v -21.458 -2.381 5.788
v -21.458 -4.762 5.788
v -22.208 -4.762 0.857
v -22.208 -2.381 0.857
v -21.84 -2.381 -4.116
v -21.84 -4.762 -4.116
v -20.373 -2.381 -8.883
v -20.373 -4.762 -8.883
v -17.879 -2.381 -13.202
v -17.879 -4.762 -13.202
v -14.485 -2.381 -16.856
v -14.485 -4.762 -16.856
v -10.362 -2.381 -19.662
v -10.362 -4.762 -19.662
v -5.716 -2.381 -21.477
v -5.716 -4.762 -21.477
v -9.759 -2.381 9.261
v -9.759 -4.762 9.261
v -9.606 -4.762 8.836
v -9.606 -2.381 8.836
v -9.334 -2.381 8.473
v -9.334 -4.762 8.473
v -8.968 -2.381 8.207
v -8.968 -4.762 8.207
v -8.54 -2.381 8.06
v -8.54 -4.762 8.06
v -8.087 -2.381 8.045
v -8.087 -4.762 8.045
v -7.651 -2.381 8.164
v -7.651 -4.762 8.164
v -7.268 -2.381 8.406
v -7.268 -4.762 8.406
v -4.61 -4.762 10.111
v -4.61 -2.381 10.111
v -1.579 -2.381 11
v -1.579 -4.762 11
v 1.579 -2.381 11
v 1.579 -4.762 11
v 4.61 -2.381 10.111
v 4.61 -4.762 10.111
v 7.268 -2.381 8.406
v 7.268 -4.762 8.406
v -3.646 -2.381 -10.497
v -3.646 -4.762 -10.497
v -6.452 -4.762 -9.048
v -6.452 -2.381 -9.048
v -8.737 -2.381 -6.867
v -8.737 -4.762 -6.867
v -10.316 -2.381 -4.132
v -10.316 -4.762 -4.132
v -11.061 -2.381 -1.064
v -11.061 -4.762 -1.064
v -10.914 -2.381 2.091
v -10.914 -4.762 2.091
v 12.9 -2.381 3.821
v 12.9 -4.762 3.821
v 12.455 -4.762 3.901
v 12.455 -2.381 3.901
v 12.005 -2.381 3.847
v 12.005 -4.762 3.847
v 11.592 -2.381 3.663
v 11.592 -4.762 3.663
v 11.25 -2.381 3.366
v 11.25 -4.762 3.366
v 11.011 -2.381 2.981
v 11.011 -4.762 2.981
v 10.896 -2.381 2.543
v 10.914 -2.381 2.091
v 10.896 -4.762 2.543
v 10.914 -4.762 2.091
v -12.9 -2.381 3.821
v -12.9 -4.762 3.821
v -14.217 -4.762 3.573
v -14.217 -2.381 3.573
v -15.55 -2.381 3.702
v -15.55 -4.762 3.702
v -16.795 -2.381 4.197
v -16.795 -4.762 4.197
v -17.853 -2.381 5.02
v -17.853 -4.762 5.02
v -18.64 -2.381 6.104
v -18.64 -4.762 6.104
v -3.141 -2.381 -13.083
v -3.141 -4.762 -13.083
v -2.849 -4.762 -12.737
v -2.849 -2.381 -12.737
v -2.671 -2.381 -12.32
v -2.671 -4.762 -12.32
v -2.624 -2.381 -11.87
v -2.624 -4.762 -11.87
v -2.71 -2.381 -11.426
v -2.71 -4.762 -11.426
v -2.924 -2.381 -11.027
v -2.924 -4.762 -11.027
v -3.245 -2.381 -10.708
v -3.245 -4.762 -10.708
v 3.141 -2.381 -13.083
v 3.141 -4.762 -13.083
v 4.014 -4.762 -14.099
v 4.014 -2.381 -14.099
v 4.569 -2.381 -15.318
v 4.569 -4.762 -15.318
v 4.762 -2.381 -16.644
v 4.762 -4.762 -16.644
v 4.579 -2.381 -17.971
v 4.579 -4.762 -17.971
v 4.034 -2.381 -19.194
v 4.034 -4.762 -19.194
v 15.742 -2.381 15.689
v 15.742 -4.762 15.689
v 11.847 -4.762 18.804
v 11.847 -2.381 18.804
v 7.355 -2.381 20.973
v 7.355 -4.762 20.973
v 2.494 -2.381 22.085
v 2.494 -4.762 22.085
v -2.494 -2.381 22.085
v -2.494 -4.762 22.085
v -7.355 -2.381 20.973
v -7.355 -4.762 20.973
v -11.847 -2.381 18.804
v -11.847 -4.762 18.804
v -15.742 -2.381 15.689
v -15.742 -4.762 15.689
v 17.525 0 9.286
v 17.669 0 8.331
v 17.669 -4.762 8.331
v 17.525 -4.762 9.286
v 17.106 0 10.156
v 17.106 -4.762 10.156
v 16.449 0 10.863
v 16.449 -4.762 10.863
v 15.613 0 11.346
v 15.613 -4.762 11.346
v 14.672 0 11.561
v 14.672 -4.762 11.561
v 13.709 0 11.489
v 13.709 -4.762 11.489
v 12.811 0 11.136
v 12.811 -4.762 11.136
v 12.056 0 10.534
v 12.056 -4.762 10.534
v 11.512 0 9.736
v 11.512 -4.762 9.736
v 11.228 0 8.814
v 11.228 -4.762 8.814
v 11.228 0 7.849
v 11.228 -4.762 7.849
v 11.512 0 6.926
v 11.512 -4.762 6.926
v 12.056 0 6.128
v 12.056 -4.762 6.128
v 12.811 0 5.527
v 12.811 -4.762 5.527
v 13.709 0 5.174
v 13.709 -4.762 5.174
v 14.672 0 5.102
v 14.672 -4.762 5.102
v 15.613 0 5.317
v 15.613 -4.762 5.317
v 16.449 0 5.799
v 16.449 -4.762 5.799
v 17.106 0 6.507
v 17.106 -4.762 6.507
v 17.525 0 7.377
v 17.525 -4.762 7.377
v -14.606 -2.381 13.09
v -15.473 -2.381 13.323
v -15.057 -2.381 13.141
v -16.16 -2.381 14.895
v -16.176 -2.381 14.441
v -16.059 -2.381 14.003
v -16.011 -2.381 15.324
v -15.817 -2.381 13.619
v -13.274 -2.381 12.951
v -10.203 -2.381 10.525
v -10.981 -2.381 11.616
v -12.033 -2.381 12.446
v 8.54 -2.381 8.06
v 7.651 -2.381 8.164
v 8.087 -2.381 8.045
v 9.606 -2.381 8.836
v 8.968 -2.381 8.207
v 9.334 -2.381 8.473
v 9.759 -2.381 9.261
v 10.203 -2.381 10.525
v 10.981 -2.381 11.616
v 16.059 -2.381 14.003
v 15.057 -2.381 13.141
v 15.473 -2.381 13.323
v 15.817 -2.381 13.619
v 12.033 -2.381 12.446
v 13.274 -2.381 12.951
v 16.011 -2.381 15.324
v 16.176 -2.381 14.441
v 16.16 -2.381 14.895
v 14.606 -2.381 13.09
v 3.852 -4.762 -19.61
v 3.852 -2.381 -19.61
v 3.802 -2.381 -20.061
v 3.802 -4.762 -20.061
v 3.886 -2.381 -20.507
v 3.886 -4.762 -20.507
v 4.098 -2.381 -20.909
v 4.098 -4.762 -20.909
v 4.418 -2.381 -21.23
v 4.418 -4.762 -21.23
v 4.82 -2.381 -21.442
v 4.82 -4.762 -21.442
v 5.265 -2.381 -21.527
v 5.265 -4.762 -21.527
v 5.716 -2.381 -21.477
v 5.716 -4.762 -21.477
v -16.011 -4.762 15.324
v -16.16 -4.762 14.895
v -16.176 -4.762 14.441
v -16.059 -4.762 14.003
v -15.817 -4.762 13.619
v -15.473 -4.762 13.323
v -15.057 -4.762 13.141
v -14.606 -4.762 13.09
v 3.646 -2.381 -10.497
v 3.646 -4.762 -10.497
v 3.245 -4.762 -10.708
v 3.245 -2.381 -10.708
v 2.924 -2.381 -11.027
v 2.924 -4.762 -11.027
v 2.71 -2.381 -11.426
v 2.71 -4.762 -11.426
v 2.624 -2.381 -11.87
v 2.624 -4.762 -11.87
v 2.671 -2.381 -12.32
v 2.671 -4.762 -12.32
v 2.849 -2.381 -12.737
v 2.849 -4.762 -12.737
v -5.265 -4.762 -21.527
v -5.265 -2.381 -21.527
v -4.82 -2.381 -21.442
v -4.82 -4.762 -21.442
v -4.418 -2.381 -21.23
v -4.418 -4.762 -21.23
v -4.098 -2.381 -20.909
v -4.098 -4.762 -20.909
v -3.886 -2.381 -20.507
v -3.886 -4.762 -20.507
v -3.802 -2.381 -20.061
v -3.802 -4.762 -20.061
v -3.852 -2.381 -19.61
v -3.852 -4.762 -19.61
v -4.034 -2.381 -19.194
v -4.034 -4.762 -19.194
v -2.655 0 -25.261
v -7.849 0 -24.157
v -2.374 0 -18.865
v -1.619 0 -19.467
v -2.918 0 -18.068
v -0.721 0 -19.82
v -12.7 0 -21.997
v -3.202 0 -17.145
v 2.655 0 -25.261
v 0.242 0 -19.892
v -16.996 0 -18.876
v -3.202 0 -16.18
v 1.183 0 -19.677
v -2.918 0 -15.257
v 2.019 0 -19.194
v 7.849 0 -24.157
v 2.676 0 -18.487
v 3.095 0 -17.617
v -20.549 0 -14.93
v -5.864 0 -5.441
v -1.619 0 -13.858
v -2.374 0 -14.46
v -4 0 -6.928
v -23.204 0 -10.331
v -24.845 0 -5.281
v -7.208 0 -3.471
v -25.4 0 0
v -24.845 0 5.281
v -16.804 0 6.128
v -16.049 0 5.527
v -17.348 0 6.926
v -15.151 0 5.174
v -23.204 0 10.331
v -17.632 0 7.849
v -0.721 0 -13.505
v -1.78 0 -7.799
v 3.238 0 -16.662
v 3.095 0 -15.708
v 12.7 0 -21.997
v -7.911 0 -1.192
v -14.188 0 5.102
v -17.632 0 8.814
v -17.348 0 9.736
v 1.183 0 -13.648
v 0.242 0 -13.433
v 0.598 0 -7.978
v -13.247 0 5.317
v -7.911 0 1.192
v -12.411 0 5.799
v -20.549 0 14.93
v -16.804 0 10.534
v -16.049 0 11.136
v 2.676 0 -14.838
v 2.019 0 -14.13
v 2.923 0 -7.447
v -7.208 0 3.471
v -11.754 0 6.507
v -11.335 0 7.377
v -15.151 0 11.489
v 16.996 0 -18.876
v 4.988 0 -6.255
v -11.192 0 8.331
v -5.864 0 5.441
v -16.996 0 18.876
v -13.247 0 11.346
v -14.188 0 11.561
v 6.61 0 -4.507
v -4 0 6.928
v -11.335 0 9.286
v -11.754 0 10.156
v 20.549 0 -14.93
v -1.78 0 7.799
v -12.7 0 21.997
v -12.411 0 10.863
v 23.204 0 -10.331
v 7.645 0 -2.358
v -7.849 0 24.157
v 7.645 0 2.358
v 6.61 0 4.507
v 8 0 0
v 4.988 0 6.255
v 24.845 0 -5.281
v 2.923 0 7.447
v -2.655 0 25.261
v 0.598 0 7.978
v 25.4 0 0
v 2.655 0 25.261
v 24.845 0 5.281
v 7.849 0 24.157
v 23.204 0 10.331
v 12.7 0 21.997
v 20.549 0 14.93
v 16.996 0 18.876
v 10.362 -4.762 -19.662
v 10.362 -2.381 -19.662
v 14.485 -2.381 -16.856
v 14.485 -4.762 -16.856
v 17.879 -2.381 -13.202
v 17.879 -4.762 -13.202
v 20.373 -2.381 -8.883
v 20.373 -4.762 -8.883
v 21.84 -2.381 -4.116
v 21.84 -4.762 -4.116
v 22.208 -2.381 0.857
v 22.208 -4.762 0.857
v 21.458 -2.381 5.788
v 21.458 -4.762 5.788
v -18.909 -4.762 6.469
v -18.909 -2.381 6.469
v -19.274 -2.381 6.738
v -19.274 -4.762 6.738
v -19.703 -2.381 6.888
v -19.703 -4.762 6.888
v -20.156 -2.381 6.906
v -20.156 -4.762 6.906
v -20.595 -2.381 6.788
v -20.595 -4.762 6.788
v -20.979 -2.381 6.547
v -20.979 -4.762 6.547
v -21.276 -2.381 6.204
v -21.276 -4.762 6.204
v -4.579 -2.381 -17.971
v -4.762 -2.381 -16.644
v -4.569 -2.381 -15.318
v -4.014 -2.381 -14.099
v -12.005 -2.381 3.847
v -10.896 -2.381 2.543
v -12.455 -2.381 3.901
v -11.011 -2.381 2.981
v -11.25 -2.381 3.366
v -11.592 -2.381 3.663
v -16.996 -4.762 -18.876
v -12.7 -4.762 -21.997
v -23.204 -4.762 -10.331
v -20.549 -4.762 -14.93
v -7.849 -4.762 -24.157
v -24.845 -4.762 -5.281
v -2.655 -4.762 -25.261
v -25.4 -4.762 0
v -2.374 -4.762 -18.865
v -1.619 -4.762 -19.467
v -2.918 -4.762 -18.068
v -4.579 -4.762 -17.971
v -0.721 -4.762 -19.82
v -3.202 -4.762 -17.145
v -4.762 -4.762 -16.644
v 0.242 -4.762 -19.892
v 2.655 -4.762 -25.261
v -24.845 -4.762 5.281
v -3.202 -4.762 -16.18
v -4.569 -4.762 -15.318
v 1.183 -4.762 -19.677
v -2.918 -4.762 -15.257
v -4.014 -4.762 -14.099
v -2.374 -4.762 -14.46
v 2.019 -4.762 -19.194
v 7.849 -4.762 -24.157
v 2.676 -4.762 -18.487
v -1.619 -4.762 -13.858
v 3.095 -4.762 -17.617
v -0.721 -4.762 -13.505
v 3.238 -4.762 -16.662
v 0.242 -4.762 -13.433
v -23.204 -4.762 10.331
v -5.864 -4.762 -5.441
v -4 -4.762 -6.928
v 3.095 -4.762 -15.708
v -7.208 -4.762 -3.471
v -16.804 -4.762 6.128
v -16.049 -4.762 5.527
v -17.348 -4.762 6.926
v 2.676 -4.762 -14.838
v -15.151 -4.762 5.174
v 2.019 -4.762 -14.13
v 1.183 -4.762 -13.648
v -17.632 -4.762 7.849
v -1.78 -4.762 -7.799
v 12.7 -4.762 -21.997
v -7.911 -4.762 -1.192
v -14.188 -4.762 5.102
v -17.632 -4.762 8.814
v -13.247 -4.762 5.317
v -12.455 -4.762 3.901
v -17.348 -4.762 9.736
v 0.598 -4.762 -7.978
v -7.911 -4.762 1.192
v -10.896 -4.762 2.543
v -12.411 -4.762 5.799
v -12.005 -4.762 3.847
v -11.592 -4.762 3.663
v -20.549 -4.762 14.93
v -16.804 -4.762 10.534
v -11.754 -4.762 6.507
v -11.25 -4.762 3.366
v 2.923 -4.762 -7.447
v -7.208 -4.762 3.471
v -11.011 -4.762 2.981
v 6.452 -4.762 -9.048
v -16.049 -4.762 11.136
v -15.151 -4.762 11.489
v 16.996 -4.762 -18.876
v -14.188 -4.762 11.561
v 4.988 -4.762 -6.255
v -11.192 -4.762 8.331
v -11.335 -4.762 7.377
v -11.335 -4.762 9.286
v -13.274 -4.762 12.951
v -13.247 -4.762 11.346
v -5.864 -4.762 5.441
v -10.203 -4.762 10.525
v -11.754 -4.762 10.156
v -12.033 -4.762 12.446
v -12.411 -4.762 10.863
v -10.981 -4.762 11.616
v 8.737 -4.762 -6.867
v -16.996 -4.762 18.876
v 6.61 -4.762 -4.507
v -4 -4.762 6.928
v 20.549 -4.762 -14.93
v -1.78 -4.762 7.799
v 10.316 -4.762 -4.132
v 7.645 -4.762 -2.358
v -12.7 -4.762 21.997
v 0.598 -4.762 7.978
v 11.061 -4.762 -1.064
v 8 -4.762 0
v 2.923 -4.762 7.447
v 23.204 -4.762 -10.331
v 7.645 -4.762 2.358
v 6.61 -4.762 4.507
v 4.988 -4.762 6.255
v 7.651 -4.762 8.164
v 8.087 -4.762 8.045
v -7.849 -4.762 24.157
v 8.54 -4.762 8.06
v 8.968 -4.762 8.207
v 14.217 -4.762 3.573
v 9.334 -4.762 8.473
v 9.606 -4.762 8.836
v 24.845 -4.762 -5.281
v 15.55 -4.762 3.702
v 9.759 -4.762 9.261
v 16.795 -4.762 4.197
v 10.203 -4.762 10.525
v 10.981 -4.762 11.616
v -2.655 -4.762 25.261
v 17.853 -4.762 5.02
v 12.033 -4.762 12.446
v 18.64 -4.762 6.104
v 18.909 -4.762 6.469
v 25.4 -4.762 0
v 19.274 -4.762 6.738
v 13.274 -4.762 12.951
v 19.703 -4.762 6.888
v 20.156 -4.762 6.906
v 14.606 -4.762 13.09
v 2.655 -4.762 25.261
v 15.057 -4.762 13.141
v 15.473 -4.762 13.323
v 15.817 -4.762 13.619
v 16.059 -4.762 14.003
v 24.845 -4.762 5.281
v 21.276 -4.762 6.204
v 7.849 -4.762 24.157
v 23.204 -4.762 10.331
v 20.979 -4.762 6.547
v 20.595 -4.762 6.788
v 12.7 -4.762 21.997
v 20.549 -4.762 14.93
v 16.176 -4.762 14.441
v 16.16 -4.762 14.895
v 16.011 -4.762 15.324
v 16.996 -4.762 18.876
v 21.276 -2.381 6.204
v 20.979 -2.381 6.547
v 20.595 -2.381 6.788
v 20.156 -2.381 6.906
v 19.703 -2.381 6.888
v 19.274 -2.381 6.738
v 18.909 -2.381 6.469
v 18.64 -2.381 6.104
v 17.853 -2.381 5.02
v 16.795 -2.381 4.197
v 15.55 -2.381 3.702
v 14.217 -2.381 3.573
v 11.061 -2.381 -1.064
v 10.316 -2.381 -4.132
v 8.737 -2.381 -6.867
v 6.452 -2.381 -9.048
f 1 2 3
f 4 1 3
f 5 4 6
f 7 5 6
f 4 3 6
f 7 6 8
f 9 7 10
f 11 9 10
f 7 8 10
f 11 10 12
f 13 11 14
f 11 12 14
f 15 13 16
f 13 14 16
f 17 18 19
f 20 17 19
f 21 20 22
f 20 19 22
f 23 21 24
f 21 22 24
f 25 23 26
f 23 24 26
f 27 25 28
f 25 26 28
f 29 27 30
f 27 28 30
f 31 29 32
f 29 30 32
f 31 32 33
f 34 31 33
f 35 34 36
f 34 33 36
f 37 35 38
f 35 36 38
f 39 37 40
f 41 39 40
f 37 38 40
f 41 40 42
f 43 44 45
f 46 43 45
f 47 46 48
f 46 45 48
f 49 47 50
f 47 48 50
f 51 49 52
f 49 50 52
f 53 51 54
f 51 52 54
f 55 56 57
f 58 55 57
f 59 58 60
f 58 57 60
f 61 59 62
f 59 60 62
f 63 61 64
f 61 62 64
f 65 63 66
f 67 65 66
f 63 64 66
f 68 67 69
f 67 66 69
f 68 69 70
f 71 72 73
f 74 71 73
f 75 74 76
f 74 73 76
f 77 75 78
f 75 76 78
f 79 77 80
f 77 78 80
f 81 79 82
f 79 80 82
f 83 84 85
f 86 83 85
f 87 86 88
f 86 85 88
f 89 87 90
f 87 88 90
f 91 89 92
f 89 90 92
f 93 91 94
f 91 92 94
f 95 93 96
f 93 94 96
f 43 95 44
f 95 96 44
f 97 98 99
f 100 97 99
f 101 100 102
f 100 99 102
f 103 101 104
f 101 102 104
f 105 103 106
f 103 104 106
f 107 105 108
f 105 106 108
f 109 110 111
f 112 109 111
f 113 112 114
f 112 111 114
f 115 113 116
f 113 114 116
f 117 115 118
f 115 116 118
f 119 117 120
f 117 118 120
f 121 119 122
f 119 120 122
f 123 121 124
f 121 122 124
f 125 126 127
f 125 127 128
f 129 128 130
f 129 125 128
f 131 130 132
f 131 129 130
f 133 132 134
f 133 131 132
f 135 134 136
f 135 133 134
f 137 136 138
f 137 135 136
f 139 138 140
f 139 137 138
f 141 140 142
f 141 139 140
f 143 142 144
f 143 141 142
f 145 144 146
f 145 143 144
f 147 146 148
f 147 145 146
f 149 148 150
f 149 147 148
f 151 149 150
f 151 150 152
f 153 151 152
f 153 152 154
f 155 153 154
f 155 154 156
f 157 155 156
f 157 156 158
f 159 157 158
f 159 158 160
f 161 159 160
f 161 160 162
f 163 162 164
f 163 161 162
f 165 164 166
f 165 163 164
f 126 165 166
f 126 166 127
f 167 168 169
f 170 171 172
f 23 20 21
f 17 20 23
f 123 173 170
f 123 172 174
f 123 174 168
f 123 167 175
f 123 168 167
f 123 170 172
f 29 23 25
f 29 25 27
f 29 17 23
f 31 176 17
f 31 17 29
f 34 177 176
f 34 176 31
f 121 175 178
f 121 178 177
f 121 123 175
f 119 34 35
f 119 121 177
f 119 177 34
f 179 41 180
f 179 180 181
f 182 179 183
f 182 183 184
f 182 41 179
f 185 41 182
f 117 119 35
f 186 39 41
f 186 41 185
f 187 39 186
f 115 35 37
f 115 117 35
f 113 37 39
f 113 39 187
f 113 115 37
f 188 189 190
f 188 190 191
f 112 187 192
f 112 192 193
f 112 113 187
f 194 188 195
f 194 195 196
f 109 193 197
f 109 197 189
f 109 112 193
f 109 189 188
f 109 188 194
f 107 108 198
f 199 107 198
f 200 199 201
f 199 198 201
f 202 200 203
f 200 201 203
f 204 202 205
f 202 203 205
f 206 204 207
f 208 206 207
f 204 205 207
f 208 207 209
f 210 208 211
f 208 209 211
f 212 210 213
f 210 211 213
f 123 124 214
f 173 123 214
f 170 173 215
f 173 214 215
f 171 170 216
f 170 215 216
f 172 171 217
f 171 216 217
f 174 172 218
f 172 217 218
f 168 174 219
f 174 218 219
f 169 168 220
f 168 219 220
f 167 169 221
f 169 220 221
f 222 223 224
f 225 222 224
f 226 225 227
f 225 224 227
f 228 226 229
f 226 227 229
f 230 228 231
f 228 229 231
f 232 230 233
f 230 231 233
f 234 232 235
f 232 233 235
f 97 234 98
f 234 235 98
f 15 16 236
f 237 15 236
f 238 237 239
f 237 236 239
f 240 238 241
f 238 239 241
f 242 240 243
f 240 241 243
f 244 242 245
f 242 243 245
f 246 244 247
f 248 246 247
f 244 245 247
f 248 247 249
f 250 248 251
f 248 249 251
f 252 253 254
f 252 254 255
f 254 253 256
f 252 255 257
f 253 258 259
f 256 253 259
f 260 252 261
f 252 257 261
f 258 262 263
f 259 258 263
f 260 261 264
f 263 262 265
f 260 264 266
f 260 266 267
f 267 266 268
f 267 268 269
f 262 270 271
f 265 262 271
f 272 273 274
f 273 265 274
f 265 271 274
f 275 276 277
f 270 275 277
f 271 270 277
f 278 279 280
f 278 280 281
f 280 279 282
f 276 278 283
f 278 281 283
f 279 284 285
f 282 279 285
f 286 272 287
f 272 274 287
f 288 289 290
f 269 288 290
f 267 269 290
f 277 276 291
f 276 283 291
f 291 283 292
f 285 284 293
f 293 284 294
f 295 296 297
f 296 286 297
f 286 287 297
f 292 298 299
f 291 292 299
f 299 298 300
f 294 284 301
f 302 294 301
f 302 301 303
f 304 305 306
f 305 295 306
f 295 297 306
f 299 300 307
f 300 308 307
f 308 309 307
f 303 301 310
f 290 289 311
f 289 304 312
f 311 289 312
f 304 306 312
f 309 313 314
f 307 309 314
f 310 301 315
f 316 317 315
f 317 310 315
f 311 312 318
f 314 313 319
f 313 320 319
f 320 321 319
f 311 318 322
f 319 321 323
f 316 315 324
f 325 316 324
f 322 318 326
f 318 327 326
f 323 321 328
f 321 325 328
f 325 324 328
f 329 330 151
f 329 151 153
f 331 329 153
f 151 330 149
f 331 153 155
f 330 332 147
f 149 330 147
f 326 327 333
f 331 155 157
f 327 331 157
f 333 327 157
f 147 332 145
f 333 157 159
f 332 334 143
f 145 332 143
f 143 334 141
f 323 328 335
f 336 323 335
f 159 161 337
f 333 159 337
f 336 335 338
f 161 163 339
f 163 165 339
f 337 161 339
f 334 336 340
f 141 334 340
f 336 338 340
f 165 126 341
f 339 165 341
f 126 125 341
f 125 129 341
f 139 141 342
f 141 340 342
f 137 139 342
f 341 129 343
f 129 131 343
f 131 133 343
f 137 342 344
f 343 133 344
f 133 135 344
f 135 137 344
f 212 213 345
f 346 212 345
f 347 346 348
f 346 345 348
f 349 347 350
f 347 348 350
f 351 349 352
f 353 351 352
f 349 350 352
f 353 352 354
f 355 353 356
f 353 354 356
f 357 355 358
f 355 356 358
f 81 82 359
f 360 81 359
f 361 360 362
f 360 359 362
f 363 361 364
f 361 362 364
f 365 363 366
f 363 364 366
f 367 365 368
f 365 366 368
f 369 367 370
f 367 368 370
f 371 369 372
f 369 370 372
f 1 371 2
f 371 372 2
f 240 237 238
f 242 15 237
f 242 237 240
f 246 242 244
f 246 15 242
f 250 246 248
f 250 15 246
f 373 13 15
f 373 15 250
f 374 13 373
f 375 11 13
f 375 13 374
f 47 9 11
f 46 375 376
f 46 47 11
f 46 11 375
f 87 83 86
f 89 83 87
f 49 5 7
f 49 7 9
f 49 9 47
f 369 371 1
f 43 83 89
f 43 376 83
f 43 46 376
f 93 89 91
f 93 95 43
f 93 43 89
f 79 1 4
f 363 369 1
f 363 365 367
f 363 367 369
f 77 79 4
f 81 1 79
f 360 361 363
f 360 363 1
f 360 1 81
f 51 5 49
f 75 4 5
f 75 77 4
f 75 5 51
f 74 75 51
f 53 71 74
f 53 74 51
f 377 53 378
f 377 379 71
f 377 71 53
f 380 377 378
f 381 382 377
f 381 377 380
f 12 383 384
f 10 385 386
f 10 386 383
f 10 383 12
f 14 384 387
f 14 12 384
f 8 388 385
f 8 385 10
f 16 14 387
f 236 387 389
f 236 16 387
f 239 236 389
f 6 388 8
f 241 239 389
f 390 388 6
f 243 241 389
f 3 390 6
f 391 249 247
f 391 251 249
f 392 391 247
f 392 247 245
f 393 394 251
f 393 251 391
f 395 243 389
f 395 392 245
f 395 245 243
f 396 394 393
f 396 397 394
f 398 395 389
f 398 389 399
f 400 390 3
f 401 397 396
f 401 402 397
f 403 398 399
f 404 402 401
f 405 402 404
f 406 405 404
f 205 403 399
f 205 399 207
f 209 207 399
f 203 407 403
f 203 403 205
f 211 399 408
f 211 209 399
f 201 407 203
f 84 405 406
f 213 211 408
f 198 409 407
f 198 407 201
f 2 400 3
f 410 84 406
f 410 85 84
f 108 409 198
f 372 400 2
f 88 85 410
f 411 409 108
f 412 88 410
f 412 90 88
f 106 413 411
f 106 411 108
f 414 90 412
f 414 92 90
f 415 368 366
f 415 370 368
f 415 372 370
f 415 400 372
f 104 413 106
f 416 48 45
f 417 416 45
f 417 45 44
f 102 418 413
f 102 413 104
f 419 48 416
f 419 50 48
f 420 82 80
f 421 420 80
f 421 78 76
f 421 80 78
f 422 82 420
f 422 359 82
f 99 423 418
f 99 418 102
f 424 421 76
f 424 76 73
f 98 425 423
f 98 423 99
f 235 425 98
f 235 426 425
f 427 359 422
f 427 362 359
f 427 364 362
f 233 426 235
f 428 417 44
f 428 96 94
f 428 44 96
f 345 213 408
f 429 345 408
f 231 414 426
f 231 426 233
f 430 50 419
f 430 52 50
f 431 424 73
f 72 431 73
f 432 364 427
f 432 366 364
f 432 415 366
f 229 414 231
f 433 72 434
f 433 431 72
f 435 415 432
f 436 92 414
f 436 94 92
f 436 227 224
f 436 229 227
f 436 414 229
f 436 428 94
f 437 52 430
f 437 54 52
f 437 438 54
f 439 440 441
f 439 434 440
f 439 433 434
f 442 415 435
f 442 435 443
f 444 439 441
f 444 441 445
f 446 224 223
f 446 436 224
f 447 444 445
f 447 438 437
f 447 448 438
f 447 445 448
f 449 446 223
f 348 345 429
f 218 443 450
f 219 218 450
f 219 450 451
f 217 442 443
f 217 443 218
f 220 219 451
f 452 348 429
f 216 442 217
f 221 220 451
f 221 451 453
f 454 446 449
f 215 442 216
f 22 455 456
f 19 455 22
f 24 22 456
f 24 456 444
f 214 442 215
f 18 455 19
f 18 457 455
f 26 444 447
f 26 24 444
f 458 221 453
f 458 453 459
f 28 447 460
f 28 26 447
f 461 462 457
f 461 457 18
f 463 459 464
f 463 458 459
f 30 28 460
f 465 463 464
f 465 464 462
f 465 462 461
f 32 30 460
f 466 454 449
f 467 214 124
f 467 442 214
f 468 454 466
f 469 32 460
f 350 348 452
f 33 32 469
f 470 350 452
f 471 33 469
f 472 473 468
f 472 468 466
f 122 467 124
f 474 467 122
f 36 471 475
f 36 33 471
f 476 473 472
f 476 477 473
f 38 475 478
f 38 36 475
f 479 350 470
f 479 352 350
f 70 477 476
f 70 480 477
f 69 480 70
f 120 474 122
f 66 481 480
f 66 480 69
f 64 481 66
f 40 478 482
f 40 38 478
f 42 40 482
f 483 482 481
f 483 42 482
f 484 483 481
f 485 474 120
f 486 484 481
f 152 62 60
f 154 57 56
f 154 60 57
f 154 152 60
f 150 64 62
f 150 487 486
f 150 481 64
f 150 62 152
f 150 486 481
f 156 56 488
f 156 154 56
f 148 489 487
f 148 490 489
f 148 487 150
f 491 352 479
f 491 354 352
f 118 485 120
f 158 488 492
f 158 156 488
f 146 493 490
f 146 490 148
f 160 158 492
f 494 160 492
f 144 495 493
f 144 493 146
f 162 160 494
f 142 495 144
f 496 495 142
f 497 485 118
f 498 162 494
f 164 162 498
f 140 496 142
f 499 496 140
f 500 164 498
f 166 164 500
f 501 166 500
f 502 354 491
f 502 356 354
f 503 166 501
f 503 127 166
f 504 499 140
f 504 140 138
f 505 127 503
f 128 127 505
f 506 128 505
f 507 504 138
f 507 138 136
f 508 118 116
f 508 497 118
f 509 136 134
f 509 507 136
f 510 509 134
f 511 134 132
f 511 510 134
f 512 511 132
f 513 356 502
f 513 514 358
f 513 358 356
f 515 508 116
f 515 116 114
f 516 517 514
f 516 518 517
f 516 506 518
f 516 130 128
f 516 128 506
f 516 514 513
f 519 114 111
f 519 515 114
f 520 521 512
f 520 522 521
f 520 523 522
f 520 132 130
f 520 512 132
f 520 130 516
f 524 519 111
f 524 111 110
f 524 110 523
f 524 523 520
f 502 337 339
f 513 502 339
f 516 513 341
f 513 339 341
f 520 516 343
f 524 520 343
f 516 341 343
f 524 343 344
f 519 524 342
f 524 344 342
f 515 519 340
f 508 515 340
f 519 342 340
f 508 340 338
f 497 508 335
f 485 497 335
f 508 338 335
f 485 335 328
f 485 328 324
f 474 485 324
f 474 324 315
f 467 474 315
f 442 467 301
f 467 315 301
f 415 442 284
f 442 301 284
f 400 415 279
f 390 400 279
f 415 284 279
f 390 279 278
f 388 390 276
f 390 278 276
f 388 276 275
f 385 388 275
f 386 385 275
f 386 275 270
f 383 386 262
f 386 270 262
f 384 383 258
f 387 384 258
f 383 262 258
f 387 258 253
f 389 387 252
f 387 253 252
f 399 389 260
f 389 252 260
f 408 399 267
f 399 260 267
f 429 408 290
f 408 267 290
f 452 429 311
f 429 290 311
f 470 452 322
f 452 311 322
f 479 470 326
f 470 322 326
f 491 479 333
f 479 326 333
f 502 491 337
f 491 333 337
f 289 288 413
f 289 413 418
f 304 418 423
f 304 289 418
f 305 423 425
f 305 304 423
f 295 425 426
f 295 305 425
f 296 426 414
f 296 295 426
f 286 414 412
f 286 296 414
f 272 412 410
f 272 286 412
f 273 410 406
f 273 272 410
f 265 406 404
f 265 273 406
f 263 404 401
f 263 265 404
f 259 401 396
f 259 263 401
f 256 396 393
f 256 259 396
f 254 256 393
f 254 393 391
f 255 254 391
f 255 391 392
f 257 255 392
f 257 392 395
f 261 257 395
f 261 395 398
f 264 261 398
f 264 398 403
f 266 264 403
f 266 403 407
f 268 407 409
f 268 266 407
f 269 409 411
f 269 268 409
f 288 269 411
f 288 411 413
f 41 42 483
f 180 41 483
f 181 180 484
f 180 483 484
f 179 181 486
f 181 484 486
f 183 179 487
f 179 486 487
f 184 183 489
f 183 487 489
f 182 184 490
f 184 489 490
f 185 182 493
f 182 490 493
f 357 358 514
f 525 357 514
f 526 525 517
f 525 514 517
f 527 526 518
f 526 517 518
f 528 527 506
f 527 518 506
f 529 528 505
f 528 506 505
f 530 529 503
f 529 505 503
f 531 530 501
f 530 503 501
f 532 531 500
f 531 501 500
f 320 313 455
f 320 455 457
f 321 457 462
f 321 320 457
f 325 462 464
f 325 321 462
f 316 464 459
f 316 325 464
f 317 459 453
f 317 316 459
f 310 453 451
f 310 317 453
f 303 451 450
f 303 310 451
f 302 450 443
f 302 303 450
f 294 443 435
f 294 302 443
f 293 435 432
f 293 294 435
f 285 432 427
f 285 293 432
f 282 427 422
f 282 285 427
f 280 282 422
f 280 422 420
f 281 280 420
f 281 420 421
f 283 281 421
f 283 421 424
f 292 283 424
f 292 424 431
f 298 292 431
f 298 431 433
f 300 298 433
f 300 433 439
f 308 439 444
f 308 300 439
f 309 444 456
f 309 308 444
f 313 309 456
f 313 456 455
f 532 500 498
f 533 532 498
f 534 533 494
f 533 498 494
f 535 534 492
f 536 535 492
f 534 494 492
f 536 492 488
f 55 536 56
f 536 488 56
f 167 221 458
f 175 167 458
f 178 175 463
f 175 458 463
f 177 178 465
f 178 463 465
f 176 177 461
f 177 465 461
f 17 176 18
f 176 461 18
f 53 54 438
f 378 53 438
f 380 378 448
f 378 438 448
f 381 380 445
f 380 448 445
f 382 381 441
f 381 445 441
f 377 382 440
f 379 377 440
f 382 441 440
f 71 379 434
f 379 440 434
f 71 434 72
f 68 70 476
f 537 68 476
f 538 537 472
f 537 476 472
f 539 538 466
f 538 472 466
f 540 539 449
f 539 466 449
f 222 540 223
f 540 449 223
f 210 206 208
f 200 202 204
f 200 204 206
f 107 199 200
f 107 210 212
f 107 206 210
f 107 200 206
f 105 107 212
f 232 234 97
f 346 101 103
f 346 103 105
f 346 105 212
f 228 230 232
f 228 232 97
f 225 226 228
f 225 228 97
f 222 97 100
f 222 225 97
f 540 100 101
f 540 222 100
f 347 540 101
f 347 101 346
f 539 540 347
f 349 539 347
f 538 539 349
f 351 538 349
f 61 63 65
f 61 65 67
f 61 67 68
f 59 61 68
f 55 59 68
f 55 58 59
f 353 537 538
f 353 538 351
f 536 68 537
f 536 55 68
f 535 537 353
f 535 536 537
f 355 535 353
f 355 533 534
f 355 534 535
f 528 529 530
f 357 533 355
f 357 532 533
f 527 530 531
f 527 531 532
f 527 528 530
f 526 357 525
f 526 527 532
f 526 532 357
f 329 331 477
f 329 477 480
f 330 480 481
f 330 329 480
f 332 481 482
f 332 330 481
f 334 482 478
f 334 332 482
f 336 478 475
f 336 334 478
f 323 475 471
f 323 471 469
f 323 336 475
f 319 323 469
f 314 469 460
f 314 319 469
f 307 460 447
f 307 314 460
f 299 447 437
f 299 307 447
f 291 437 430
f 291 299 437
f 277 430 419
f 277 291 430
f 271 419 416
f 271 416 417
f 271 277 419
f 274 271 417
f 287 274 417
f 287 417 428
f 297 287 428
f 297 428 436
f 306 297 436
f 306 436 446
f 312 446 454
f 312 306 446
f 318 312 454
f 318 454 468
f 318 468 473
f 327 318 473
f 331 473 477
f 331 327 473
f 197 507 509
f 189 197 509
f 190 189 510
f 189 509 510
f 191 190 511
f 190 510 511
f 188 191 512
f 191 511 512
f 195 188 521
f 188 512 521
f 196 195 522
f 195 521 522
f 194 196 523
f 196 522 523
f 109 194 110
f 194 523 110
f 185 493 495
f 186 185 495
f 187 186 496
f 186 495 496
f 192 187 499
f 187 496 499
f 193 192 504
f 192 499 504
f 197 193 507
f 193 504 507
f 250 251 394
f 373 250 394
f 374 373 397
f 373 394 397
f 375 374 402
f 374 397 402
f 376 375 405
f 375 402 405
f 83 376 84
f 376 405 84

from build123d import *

# Parameters (mm, degrees)
F0_R     = 25.4
F0_R_2   = 3.2385
F0_R_3   = 8
F1_DEPTH = 4.7625
F3_DEPTH = 2.38125


with BuildPart() as f1:
    # F0 (on Front) → F1 (new body)
    with BuildSketch(Plane.XZ):
        Circle(F0_R)
        with Locations((0, -16.6624)):
            Circle(F0_R_2, mode=Mode.SUBTRACT)
        Circle(F0_R_3, mode=Mode.SUBTRACT)
        with Locations((-14.430062, 8.3312)):
            Circle(F0_R_2, mode=Mode.SUBTRACT)
        with Locations((14.430062, 8.3312)):
            Circle(F0_R_2, mode=Mode.SUBTRACT)
    extrude(amount=F1_DEPTH)

    # F2 (on face) → F3 (cut)
    with BuildSketch(Plane.XZ.offset(4.7625)):
        with BuildLine():
            ThreePointArc((-3.646079, -10.497322), (-9.623707, -5.55625), (-10.913987, 2.091064))
            ThreePointArc((-10.913987, 2.091064), (-11.409826, 3.527057), (-12.900289, 3.821078))
            ThreePointArc((-12.900289, 3.821078), (-16.190201, 3.905896), (-18.639619, 6.103863))
            ThreePointArc((-18.639619, 6.103863), (-20.156405, 6.905634), (-21.458089, 5.788007))
            ThreePointArc((-21.458089, 5.788007), (-19.247415, -11.1125), (-5.716484, -21.477254))
            ThreePointArc((-5.716484, -21.477254), (-4.097748, -20.908775), (-4.033709, -19.194315))
            ThreePointArc((-4.033709, -19.194315), (-4.712495, -15.974073), (-3.140994, -13.082517))
            ThreePointArc((-3.140994, -13.082517), (-2.650392, -11.644727), (-3.646079, -10.497322))
        make_face()
        with BuildLine():
            ThreePointArc((-7.267908, 8.406258), (0, 11.1125), (7.267908, 8.406258))
            ThreePointArc((7.267908, 8.406258), (8.759433, 8.11767), (9.759295, 9.261439))
            ThreePointArc((9.759295, 9.261439), (11.477705, 12.068177), (14.60591, 13.090452))
            ThreePointArc((14.60591, 13.090452), (16.058657, 14.003141), (15.741606, 15.689247))
            ThreePointArc((15.741606, 15.689247), (0, 22.225), (-15.741606, 15.689247))
            ThreePointArc((-15.741606, 15.689247), (-16.058657, 14.003141), (-14.60591, 13.090452))
            ThreePointArc((-14.60591, 13.090452), (-11.477705, 12.068177), (-9.759295, 9.261439))
            ThreePointArc((-9.759295, 9.261439), (-8.759433, 8.11767), (-7.267908, 8.406258))
        make_face()
        with BuildLine():
            ThreePointArc((10.913987, 2.091064), (9.623707, -5.55625), (3.646079, -10.497322))
            ThreePointArc((3.646079, -10.497322), (2.650392, -11.644727), (3.140994, -13.082517))
            ThreePointArc((3.140994, -13.082517), (4.712495, -15.974073), (4.033709, -19.194315))
            ThreePointArc((4.033709, -19.194315), (4.097748, -20.908775), (5.716484, -21.477254))
            ThreePointArc((5.716484, -21.477254), (19.247415, -11.1125), (21.458089, 5.788007))
            ThreePointArc((21.458089, 5.788007), (20.156405, 6.905634), (18.639619, 6.103863))
            ThreePointArc((18.639619, 6.103863), (16.190201, 3.905896), (12.900289, 3.821078))
            ThreePointArc((12.900289, 3.821078), (11.409826, 3.527057), (10.913987, 2.091064))
        make_face()
    extrude(amount=-F3_DEPTH, mode=Mode.SUBTRACT)


solid = f1.part
